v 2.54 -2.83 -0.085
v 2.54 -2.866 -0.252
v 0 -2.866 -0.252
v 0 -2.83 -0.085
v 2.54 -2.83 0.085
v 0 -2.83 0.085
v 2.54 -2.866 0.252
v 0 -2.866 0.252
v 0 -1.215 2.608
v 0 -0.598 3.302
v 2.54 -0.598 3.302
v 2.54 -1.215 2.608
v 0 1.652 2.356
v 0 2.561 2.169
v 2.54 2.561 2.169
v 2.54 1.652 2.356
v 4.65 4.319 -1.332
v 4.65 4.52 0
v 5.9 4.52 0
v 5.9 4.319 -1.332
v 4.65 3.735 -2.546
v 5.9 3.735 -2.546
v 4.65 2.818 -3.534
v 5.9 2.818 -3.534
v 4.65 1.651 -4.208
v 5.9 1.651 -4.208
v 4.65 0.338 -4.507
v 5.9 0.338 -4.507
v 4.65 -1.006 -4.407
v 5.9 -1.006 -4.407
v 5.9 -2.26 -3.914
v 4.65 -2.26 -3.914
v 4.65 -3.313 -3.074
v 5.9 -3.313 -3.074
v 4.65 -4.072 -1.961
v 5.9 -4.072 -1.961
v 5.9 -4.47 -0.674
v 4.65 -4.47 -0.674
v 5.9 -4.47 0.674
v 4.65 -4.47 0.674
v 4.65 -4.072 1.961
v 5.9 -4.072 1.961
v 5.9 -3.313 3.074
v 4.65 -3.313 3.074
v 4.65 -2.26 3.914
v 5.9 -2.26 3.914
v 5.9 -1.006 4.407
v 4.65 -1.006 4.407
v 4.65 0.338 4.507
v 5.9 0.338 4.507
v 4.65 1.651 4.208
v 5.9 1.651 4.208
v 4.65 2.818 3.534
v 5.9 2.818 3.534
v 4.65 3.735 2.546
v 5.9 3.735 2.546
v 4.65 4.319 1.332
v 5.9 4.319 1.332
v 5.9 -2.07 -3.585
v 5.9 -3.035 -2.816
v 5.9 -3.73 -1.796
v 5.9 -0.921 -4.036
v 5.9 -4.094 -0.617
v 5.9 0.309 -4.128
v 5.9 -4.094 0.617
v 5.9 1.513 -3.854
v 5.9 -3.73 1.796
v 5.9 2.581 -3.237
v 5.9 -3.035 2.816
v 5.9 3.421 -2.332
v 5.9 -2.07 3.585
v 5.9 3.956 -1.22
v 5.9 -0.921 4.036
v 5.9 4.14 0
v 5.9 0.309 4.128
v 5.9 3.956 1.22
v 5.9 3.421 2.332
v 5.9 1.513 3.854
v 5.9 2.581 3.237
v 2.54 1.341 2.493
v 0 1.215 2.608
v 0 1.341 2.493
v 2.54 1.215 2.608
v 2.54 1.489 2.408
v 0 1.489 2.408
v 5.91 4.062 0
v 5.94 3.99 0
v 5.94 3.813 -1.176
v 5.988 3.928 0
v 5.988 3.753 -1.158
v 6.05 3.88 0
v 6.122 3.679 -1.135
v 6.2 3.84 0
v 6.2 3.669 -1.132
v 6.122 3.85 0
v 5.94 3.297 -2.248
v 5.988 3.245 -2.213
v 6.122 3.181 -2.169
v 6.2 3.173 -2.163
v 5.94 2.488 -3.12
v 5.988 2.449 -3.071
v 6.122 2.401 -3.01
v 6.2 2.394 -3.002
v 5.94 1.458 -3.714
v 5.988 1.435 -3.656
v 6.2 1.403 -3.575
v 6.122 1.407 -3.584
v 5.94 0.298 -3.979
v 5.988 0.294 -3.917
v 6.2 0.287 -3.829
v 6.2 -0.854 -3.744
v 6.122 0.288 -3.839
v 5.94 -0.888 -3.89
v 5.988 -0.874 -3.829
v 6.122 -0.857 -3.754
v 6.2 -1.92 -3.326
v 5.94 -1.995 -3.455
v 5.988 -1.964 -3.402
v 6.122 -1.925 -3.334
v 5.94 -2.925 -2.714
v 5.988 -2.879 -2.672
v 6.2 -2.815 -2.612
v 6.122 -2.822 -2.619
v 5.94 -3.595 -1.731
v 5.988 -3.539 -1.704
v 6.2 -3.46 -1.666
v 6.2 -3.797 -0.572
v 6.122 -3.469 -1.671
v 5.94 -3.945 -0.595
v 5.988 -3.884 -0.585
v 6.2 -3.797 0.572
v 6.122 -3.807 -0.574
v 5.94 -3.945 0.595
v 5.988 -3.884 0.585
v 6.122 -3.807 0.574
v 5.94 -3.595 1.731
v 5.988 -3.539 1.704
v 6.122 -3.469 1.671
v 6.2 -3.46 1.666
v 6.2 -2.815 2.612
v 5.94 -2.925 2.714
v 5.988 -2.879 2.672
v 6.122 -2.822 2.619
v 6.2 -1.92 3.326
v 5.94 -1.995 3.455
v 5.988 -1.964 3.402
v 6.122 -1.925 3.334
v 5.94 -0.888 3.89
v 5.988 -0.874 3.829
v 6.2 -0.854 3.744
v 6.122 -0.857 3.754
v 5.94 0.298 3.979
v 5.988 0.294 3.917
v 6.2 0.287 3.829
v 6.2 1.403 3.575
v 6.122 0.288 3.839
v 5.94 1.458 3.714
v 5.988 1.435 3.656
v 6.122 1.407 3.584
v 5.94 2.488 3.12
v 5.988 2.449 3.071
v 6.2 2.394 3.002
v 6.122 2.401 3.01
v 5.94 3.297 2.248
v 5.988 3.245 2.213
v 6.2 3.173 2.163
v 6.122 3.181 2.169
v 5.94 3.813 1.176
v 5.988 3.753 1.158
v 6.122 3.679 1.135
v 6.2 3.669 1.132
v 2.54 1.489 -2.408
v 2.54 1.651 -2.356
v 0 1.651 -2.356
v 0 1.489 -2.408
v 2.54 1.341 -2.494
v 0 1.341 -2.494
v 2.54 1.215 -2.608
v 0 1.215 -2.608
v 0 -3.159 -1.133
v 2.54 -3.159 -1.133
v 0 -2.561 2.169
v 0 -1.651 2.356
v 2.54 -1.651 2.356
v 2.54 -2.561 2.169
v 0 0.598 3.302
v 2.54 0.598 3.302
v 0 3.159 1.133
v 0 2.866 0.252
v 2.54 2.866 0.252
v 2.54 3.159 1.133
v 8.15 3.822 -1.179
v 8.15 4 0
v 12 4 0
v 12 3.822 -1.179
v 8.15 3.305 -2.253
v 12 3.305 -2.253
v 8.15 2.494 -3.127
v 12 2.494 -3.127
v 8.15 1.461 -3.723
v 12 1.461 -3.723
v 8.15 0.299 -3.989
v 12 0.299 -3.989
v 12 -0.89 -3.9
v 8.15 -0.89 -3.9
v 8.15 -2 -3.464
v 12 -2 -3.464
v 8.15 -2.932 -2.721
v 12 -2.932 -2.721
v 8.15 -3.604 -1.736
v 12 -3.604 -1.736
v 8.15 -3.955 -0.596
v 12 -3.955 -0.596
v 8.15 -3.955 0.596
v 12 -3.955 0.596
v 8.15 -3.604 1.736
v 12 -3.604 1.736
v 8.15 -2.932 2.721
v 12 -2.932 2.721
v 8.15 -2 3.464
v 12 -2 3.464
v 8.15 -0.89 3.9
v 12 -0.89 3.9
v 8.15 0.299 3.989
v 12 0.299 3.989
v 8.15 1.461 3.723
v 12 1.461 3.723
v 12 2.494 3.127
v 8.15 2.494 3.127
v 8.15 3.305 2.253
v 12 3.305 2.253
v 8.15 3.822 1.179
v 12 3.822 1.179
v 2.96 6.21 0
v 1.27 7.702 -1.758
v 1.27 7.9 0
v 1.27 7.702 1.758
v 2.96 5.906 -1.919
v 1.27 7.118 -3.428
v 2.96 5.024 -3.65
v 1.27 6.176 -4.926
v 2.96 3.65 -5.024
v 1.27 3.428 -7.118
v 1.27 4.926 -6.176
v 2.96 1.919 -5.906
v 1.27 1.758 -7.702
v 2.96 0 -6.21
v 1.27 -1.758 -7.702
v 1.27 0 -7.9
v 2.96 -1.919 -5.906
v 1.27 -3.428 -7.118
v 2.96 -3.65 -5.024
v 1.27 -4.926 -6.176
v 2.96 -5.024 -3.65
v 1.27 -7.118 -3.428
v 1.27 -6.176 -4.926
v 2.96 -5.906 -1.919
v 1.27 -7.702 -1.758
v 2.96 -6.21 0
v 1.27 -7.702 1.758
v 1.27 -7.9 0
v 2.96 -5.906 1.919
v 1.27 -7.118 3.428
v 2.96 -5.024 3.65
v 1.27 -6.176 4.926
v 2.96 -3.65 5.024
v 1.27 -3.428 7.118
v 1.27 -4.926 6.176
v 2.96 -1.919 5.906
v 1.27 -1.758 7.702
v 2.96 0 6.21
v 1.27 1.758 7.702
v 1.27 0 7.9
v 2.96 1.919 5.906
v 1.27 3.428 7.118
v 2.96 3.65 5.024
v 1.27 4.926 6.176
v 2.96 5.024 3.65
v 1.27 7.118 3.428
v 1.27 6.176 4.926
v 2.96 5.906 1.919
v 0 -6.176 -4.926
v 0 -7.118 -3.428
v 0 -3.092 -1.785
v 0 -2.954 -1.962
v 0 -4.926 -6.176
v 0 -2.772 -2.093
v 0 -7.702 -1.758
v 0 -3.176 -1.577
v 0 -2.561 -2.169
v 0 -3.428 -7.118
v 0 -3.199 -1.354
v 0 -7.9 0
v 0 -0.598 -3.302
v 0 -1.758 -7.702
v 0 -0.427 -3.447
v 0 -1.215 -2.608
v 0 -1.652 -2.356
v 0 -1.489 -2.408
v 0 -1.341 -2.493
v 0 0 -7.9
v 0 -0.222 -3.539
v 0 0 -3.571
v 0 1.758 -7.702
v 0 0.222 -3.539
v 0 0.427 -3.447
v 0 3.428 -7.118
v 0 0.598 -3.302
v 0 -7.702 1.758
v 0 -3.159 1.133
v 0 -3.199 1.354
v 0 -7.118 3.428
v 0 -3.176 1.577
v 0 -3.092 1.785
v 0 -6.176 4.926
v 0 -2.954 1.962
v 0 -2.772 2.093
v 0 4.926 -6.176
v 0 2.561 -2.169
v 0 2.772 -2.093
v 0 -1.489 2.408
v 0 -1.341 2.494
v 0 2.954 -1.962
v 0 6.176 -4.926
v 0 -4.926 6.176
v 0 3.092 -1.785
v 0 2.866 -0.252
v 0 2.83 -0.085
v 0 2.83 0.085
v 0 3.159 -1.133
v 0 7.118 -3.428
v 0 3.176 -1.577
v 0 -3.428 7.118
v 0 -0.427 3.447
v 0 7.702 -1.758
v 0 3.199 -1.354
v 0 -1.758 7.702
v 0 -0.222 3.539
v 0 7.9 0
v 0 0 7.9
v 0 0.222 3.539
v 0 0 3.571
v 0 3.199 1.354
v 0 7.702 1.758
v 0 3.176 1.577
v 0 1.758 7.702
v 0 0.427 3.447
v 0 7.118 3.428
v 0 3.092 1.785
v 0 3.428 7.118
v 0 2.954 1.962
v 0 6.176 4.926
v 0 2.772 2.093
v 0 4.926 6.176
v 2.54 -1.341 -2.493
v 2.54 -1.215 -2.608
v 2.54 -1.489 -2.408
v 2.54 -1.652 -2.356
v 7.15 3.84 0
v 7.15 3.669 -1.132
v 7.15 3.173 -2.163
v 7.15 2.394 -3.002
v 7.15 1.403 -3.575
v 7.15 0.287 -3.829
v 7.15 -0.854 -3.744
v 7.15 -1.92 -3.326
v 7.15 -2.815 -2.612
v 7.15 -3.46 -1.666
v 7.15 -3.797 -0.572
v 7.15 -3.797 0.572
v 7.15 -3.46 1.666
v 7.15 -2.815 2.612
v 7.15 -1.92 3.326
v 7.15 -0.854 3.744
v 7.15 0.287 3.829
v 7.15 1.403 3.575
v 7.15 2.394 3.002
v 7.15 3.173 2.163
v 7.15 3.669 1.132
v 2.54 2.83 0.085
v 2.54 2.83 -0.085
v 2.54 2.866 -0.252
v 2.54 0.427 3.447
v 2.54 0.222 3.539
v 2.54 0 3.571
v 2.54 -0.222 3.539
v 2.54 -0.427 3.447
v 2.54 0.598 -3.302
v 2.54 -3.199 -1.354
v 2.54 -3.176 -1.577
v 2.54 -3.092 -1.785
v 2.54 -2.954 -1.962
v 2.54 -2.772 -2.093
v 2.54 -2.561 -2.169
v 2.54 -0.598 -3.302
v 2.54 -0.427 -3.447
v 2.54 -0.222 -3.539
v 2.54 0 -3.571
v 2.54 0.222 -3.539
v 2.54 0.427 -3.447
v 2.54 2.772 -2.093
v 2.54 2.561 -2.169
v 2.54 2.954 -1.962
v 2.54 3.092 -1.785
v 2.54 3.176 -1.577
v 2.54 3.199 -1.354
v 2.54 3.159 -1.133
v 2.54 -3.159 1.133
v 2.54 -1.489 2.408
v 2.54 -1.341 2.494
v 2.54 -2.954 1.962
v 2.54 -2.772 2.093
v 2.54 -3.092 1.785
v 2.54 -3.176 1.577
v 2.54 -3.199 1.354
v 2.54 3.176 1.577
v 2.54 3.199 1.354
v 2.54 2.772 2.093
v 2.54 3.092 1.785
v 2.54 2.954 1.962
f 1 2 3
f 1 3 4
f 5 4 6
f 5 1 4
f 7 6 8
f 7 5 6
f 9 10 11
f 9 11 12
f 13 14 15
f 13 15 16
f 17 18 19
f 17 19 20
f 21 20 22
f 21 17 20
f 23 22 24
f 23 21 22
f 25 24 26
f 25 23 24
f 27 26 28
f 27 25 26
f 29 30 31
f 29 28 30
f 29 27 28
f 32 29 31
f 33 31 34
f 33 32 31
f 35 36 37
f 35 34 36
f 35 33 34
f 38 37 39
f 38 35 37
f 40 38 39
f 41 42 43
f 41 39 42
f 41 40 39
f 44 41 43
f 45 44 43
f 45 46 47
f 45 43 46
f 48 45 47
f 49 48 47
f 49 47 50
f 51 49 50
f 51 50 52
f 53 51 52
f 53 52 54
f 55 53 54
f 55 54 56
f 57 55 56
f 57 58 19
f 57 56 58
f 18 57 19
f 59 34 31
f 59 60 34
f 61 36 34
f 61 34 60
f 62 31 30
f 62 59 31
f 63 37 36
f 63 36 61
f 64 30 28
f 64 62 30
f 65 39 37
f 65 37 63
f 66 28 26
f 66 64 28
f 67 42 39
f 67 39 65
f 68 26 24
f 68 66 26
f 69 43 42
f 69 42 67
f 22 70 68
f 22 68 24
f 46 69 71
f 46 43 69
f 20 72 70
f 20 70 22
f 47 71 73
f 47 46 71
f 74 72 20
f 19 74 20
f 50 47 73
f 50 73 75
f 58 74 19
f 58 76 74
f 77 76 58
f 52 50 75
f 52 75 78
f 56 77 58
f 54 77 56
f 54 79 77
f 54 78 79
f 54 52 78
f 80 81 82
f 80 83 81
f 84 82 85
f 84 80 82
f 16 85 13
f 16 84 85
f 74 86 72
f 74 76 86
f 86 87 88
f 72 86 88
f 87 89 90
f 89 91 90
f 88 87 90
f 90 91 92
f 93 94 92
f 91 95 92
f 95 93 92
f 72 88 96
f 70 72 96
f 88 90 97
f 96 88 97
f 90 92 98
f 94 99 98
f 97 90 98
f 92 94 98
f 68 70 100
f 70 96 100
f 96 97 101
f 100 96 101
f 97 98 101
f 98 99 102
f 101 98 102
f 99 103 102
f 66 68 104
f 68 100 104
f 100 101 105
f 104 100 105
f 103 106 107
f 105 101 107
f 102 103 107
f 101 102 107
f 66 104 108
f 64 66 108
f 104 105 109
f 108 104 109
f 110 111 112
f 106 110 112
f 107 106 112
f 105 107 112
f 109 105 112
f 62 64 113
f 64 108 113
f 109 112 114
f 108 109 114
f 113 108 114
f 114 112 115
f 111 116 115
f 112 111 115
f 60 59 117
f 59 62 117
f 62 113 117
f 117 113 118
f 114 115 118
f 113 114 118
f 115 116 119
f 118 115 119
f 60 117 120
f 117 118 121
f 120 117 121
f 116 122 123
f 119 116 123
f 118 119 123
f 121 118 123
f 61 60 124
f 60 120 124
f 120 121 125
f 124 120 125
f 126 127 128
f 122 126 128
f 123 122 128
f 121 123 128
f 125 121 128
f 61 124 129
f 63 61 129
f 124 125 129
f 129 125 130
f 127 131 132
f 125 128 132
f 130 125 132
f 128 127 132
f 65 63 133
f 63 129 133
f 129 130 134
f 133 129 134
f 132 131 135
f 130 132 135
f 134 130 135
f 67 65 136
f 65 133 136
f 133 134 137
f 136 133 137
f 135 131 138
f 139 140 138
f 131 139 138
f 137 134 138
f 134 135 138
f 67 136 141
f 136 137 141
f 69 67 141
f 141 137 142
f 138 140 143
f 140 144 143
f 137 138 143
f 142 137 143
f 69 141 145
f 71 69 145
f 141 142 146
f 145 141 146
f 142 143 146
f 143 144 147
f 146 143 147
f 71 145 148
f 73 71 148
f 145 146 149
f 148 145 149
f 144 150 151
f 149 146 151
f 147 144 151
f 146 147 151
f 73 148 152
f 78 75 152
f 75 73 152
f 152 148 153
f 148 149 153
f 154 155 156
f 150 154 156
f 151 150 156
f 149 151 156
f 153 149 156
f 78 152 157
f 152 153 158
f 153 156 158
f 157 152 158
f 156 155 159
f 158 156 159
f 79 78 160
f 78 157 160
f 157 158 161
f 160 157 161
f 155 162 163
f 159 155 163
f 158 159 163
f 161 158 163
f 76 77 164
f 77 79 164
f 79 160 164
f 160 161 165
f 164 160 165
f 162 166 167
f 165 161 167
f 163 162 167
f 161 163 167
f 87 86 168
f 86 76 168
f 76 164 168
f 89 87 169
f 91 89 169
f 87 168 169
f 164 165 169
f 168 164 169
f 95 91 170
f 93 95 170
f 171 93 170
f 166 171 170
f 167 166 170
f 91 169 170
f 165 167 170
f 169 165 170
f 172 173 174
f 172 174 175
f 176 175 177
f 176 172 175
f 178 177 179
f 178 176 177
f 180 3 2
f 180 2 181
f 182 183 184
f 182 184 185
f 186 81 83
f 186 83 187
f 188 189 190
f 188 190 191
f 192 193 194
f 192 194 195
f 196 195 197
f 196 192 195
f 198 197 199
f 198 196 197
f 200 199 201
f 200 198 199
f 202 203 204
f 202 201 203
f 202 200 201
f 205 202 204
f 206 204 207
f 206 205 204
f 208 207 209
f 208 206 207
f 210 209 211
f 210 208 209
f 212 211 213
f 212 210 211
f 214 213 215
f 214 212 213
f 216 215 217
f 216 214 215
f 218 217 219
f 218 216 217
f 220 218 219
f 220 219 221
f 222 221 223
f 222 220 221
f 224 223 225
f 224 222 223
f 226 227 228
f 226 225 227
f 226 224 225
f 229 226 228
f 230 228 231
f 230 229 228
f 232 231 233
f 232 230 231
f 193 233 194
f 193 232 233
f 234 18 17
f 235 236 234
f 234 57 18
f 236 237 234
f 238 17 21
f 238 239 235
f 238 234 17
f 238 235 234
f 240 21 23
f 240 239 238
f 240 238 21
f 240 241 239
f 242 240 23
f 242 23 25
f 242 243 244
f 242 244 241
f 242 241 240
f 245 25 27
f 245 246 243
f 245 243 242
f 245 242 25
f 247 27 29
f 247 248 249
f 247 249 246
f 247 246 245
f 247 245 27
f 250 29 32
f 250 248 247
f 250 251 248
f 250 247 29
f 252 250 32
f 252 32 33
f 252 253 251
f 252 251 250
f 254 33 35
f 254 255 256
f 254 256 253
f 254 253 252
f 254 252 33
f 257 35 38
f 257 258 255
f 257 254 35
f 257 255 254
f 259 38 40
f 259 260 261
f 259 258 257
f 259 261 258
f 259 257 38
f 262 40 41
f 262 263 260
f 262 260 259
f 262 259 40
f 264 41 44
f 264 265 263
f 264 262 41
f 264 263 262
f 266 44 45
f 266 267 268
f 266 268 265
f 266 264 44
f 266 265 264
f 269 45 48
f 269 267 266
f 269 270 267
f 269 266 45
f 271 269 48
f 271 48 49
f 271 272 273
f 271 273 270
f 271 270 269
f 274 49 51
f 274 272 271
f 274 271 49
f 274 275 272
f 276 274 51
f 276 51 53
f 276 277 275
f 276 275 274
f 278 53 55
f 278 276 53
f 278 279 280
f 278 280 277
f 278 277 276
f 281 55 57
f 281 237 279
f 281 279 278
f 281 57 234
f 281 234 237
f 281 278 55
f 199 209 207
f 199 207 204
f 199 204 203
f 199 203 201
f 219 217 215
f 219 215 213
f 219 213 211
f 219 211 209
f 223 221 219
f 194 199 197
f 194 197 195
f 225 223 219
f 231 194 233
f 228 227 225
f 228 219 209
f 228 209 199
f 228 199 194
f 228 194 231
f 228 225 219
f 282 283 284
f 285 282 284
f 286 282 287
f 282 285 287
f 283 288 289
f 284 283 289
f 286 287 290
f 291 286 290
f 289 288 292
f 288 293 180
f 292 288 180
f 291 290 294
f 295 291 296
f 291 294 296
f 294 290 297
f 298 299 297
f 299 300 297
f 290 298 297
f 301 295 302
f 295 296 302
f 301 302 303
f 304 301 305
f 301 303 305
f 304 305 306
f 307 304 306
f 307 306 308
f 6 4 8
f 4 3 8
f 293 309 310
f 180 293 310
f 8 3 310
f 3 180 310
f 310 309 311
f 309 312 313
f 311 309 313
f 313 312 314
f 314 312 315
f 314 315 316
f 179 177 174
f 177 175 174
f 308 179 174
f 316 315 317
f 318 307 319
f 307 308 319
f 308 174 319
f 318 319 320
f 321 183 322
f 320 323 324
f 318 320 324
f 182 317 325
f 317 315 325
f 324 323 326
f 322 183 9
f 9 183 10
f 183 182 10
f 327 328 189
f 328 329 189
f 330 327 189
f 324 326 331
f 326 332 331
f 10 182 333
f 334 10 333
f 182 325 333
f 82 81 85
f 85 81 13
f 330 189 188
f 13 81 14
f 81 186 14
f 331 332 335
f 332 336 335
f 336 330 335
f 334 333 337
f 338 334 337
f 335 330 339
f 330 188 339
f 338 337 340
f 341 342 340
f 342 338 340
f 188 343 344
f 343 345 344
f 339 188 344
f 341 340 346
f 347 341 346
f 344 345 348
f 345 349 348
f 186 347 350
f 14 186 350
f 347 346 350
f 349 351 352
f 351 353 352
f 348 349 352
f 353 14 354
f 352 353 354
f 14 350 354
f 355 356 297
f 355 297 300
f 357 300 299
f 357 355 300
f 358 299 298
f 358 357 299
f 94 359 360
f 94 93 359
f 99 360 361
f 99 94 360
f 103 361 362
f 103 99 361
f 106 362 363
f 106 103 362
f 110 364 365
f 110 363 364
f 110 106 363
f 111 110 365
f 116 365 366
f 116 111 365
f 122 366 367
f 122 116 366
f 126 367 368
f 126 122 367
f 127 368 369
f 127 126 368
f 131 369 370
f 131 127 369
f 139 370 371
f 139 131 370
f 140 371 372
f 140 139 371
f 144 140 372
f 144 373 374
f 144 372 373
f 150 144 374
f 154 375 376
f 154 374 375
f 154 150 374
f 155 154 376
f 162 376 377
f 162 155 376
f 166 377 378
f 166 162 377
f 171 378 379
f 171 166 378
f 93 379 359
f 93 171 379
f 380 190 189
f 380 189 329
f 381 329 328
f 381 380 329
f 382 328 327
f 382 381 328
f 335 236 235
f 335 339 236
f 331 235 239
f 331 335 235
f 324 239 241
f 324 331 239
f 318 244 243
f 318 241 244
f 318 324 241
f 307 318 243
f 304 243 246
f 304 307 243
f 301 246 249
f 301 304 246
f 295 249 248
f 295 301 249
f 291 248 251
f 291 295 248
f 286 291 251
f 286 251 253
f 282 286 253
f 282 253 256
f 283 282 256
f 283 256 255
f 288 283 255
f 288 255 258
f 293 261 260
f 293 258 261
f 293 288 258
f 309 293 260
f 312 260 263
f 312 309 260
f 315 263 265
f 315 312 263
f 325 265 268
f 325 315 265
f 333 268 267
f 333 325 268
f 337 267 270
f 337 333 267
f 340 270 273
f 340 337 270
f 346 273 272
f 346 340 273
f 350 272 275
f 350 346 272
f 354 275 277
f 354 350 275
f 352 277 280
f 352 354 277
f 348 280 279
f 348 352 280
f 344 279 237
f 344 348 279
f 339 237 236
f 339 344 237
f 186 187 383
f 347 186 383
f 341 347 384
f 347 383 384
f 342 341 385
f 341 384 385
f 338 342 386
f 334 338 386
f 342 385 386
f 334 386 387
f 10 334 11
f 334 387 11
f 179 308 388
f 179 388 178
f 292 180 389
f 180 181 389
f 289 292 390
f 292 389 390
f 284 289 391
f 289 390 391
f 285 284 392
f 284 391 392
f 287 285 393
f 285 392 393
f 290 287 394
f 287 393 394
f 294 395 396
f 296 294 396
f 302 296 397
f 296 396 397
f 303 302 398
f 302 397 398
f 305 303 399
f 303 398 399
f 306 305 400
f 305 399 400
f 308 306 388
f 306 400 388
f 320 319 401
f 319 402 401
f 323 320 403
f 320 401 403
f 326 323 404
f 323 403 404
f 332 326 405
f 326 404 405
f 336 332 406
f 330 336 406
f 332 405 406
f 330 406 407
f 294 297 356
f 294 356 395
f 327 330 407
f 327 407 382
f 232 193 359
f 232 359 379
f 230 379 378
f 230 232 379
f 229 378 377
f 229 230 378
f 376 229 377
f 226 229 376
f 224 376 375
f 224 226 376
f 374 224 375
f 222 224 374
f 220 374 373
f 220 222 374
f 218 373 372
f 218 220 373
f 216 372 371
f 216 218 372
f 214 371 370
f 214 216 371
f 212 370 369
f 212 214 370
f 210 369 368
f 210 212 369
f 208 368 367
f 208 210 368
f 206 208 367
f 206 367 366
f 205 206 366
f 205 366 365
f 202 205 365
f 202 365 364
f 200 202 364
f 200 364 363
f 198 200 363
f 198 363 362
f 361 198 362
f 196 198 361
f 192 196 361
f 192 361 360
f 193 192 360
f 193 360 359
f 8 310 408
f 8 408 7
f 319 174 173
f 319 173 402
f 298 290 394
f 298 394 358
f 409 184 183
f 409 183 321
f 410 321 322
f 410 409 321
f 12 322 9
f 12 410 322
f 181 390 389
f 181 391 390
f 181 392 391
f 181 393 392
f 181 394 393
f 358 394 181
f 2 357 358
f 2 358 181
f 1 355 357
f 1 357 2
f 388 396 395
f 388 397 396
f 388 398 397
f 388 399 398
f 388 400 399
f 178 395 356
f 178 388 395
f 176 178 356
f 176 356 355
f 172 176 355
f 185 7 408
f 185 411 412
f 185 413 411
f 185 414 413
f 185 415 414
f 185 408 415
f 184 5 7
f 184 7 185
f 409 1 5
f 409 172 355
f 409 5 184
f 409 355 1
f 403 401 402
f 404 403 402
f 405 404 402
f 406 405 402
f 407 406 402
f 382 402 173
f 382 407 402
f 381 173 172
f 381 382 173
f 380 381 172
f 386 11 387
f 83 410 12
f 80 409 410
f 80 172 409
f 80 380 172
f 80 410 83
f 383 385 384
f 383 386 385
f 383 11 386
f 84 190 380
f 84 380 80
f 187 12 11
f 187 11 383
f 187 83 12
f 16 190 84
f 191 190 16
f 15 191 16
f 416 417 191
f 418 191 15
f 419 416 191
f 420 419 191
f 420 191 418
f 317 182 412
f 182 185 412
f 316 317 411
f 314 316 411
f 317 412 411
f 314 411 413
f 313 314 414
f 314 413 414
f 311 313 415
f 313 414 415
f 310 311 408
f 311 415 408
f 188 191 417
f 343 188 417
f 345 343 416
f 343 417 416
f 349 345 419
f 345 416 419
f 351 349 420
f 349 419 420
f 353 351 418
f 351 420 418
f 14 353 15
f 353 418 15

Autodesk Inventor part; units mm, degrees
ref_plane "YZ Plane" through (0, 0, 0) normal (1, 0, 0) x (0, 1, 0)
ref_plane "XZ Plane" through (0, 0, 0) normal (0, 1, 0) x (-1, 0, 0)
ref_plane "XY Plane" through (0, 0, 0) normal (0, 0, 1) x (1, 0, 0)
sketch "Sketch1" plane through (0, 0, 0) normal (0, 0, 1) x (1, 0, 0)
  line L0 (0, 0) -> (12, 0)
  line L1 (12, 0) -> (12, 4)
  line L2 (12, 4) -> (8.15, 4)
  line L3 (8.15, 4) -> (7.15, 3.84)
  line L4 (7.15, 3.84) -> (6.2, 3.84)
  line L5 (5.9, 4.52) -> (4.65, 4.52)
  line L6 (4.65, 4.52) -> (1.27, 7.9)
  line L7 (1.27, 7.9) -> (0, 7.9)
  line L8 (0, 7.9) -> (0, 0)
  line L9 (5.9, 4.52) -> (5.9, 4.14)
  arc A0 (5.9, 4.14) -> (6.2, 3.84) centre (6.2, 4.14) ccw
  dimension "d17" = 12
  dimension "d18" = 1.27
  dimension "d19" = 4.65
  dimension "d20" = 1.25
  dimension "d21" = 15.8
  dimension "d22" = 8
  dimension "d23" = 7.68
  dimension "d25" = 45
  dimension "d26" = 1
  dimension "d28" = 0.3
  dimension "d29" = 3.85
  dimension "d30" = 0.3
  dimension "d52" = 3.5
revolve "Revolution1" add sketch "Sketch1" angle 360 about axis through (0, 0, 0) along (1, 0, 0)
thread "Thread1" size "M8x1.25" class "6g" standard "ISO Metric profile" length 3.85
sketch "Sketch2" plane through (0, 0, 0) normal (-1, 0, 0) x (0, 0, 1)
  circle A0 centre (0, 0) radius 3.975 construction
  circle A1 centre (0, 0) radius 2.7825 construction
  line L0 (0, 0) -> (2.4097, 1.3913)
  line L1 (0, 0) -> (2.7825, 0) construction
  line L2 (0, 0) -> (2.4097, -1.3912)
  line L3 (0, 0) -> (2.7825, 0) construction
  line L4 (2.4097, 1.3913) -> (3.975, 0)
  line L5 (3.975, 0) -> (2.4097, -1.3912)
  dimension "d34" = 7.95
  dimension "d35" = 5.565
  dimension "d39" = 30
  dimension "d40" = 330
extrude "Extrusion1" cut sketch "Sketch2" against normal blind 2.54
pattern_circular "Circular Pattern1" count 6 over 360 about axis through (-10, 0, 0) along (1, 0, 0) of "Extrusion1"
fillet "Fillet1" radius 0.8 12 edges at (1.27, 1.3913, 2.4097) (1.27, 0, 3.975) (1.27, -1.3912, 2.4097) (1.27, -2.7825, 0) (1.27, -3.4425, 1.9875) (1.27, -3.4425, -1.9875) (1.27, -1.3912, -2.4097) (1.27, 0, -3.975) (1.27, 1.3912, -2.4097) (1.27, 3.4425, -1.9875) (1.27, 2.7825, 0) (1.27, 3.4425, 1.9875)
equation "\"d17\" = l_"
equation "\"d18\" = 0.5 * t"
equation "\"d19\" = k"
equation "\"d20\" = shldr"
equation "\"d21\" = dk"
equation "\"d22\" = d"
equation "\"d23\" = ds_"
equation "\"d25\" = 0.5 * headAngle"
equation "\"d26\" = x"
equation "\"d28\" = r"
equation "\"d29\" = b"
equation "\"d32\" = b"
equation "\"d34\" = A_"
equation "\"d35\" = 0.7 * A_"
equation "\"d43\" = t"
equation "\"d48\" = v"
equation "\"A_\" = 7.95"
equation "\"t\" = 2.54"
equation "\"v\" = 0.1 * d"
equation "\"dk\" = 15.8"
equation "\"k\" = 4.65"
equation "\"l_\" = 12"
equation "\"shldr\" = 1.25"
equation "\"d\" = 8"
equation "\"p\" = 0.8"
equation "\"x\" = 1"
equation "\"ds_\" = 0.96 * d"
equation "\"headAngle\" = 90deg"
equation "\"c_\" = 0.35 * v"
equation "\"r\" = 0.3"
equation "\"b\" = 3.85"
properties part number "Vite a testa svasata piana incassata esalobulare ISO 14581 - M8x12-4.8" material "Acciaio"
